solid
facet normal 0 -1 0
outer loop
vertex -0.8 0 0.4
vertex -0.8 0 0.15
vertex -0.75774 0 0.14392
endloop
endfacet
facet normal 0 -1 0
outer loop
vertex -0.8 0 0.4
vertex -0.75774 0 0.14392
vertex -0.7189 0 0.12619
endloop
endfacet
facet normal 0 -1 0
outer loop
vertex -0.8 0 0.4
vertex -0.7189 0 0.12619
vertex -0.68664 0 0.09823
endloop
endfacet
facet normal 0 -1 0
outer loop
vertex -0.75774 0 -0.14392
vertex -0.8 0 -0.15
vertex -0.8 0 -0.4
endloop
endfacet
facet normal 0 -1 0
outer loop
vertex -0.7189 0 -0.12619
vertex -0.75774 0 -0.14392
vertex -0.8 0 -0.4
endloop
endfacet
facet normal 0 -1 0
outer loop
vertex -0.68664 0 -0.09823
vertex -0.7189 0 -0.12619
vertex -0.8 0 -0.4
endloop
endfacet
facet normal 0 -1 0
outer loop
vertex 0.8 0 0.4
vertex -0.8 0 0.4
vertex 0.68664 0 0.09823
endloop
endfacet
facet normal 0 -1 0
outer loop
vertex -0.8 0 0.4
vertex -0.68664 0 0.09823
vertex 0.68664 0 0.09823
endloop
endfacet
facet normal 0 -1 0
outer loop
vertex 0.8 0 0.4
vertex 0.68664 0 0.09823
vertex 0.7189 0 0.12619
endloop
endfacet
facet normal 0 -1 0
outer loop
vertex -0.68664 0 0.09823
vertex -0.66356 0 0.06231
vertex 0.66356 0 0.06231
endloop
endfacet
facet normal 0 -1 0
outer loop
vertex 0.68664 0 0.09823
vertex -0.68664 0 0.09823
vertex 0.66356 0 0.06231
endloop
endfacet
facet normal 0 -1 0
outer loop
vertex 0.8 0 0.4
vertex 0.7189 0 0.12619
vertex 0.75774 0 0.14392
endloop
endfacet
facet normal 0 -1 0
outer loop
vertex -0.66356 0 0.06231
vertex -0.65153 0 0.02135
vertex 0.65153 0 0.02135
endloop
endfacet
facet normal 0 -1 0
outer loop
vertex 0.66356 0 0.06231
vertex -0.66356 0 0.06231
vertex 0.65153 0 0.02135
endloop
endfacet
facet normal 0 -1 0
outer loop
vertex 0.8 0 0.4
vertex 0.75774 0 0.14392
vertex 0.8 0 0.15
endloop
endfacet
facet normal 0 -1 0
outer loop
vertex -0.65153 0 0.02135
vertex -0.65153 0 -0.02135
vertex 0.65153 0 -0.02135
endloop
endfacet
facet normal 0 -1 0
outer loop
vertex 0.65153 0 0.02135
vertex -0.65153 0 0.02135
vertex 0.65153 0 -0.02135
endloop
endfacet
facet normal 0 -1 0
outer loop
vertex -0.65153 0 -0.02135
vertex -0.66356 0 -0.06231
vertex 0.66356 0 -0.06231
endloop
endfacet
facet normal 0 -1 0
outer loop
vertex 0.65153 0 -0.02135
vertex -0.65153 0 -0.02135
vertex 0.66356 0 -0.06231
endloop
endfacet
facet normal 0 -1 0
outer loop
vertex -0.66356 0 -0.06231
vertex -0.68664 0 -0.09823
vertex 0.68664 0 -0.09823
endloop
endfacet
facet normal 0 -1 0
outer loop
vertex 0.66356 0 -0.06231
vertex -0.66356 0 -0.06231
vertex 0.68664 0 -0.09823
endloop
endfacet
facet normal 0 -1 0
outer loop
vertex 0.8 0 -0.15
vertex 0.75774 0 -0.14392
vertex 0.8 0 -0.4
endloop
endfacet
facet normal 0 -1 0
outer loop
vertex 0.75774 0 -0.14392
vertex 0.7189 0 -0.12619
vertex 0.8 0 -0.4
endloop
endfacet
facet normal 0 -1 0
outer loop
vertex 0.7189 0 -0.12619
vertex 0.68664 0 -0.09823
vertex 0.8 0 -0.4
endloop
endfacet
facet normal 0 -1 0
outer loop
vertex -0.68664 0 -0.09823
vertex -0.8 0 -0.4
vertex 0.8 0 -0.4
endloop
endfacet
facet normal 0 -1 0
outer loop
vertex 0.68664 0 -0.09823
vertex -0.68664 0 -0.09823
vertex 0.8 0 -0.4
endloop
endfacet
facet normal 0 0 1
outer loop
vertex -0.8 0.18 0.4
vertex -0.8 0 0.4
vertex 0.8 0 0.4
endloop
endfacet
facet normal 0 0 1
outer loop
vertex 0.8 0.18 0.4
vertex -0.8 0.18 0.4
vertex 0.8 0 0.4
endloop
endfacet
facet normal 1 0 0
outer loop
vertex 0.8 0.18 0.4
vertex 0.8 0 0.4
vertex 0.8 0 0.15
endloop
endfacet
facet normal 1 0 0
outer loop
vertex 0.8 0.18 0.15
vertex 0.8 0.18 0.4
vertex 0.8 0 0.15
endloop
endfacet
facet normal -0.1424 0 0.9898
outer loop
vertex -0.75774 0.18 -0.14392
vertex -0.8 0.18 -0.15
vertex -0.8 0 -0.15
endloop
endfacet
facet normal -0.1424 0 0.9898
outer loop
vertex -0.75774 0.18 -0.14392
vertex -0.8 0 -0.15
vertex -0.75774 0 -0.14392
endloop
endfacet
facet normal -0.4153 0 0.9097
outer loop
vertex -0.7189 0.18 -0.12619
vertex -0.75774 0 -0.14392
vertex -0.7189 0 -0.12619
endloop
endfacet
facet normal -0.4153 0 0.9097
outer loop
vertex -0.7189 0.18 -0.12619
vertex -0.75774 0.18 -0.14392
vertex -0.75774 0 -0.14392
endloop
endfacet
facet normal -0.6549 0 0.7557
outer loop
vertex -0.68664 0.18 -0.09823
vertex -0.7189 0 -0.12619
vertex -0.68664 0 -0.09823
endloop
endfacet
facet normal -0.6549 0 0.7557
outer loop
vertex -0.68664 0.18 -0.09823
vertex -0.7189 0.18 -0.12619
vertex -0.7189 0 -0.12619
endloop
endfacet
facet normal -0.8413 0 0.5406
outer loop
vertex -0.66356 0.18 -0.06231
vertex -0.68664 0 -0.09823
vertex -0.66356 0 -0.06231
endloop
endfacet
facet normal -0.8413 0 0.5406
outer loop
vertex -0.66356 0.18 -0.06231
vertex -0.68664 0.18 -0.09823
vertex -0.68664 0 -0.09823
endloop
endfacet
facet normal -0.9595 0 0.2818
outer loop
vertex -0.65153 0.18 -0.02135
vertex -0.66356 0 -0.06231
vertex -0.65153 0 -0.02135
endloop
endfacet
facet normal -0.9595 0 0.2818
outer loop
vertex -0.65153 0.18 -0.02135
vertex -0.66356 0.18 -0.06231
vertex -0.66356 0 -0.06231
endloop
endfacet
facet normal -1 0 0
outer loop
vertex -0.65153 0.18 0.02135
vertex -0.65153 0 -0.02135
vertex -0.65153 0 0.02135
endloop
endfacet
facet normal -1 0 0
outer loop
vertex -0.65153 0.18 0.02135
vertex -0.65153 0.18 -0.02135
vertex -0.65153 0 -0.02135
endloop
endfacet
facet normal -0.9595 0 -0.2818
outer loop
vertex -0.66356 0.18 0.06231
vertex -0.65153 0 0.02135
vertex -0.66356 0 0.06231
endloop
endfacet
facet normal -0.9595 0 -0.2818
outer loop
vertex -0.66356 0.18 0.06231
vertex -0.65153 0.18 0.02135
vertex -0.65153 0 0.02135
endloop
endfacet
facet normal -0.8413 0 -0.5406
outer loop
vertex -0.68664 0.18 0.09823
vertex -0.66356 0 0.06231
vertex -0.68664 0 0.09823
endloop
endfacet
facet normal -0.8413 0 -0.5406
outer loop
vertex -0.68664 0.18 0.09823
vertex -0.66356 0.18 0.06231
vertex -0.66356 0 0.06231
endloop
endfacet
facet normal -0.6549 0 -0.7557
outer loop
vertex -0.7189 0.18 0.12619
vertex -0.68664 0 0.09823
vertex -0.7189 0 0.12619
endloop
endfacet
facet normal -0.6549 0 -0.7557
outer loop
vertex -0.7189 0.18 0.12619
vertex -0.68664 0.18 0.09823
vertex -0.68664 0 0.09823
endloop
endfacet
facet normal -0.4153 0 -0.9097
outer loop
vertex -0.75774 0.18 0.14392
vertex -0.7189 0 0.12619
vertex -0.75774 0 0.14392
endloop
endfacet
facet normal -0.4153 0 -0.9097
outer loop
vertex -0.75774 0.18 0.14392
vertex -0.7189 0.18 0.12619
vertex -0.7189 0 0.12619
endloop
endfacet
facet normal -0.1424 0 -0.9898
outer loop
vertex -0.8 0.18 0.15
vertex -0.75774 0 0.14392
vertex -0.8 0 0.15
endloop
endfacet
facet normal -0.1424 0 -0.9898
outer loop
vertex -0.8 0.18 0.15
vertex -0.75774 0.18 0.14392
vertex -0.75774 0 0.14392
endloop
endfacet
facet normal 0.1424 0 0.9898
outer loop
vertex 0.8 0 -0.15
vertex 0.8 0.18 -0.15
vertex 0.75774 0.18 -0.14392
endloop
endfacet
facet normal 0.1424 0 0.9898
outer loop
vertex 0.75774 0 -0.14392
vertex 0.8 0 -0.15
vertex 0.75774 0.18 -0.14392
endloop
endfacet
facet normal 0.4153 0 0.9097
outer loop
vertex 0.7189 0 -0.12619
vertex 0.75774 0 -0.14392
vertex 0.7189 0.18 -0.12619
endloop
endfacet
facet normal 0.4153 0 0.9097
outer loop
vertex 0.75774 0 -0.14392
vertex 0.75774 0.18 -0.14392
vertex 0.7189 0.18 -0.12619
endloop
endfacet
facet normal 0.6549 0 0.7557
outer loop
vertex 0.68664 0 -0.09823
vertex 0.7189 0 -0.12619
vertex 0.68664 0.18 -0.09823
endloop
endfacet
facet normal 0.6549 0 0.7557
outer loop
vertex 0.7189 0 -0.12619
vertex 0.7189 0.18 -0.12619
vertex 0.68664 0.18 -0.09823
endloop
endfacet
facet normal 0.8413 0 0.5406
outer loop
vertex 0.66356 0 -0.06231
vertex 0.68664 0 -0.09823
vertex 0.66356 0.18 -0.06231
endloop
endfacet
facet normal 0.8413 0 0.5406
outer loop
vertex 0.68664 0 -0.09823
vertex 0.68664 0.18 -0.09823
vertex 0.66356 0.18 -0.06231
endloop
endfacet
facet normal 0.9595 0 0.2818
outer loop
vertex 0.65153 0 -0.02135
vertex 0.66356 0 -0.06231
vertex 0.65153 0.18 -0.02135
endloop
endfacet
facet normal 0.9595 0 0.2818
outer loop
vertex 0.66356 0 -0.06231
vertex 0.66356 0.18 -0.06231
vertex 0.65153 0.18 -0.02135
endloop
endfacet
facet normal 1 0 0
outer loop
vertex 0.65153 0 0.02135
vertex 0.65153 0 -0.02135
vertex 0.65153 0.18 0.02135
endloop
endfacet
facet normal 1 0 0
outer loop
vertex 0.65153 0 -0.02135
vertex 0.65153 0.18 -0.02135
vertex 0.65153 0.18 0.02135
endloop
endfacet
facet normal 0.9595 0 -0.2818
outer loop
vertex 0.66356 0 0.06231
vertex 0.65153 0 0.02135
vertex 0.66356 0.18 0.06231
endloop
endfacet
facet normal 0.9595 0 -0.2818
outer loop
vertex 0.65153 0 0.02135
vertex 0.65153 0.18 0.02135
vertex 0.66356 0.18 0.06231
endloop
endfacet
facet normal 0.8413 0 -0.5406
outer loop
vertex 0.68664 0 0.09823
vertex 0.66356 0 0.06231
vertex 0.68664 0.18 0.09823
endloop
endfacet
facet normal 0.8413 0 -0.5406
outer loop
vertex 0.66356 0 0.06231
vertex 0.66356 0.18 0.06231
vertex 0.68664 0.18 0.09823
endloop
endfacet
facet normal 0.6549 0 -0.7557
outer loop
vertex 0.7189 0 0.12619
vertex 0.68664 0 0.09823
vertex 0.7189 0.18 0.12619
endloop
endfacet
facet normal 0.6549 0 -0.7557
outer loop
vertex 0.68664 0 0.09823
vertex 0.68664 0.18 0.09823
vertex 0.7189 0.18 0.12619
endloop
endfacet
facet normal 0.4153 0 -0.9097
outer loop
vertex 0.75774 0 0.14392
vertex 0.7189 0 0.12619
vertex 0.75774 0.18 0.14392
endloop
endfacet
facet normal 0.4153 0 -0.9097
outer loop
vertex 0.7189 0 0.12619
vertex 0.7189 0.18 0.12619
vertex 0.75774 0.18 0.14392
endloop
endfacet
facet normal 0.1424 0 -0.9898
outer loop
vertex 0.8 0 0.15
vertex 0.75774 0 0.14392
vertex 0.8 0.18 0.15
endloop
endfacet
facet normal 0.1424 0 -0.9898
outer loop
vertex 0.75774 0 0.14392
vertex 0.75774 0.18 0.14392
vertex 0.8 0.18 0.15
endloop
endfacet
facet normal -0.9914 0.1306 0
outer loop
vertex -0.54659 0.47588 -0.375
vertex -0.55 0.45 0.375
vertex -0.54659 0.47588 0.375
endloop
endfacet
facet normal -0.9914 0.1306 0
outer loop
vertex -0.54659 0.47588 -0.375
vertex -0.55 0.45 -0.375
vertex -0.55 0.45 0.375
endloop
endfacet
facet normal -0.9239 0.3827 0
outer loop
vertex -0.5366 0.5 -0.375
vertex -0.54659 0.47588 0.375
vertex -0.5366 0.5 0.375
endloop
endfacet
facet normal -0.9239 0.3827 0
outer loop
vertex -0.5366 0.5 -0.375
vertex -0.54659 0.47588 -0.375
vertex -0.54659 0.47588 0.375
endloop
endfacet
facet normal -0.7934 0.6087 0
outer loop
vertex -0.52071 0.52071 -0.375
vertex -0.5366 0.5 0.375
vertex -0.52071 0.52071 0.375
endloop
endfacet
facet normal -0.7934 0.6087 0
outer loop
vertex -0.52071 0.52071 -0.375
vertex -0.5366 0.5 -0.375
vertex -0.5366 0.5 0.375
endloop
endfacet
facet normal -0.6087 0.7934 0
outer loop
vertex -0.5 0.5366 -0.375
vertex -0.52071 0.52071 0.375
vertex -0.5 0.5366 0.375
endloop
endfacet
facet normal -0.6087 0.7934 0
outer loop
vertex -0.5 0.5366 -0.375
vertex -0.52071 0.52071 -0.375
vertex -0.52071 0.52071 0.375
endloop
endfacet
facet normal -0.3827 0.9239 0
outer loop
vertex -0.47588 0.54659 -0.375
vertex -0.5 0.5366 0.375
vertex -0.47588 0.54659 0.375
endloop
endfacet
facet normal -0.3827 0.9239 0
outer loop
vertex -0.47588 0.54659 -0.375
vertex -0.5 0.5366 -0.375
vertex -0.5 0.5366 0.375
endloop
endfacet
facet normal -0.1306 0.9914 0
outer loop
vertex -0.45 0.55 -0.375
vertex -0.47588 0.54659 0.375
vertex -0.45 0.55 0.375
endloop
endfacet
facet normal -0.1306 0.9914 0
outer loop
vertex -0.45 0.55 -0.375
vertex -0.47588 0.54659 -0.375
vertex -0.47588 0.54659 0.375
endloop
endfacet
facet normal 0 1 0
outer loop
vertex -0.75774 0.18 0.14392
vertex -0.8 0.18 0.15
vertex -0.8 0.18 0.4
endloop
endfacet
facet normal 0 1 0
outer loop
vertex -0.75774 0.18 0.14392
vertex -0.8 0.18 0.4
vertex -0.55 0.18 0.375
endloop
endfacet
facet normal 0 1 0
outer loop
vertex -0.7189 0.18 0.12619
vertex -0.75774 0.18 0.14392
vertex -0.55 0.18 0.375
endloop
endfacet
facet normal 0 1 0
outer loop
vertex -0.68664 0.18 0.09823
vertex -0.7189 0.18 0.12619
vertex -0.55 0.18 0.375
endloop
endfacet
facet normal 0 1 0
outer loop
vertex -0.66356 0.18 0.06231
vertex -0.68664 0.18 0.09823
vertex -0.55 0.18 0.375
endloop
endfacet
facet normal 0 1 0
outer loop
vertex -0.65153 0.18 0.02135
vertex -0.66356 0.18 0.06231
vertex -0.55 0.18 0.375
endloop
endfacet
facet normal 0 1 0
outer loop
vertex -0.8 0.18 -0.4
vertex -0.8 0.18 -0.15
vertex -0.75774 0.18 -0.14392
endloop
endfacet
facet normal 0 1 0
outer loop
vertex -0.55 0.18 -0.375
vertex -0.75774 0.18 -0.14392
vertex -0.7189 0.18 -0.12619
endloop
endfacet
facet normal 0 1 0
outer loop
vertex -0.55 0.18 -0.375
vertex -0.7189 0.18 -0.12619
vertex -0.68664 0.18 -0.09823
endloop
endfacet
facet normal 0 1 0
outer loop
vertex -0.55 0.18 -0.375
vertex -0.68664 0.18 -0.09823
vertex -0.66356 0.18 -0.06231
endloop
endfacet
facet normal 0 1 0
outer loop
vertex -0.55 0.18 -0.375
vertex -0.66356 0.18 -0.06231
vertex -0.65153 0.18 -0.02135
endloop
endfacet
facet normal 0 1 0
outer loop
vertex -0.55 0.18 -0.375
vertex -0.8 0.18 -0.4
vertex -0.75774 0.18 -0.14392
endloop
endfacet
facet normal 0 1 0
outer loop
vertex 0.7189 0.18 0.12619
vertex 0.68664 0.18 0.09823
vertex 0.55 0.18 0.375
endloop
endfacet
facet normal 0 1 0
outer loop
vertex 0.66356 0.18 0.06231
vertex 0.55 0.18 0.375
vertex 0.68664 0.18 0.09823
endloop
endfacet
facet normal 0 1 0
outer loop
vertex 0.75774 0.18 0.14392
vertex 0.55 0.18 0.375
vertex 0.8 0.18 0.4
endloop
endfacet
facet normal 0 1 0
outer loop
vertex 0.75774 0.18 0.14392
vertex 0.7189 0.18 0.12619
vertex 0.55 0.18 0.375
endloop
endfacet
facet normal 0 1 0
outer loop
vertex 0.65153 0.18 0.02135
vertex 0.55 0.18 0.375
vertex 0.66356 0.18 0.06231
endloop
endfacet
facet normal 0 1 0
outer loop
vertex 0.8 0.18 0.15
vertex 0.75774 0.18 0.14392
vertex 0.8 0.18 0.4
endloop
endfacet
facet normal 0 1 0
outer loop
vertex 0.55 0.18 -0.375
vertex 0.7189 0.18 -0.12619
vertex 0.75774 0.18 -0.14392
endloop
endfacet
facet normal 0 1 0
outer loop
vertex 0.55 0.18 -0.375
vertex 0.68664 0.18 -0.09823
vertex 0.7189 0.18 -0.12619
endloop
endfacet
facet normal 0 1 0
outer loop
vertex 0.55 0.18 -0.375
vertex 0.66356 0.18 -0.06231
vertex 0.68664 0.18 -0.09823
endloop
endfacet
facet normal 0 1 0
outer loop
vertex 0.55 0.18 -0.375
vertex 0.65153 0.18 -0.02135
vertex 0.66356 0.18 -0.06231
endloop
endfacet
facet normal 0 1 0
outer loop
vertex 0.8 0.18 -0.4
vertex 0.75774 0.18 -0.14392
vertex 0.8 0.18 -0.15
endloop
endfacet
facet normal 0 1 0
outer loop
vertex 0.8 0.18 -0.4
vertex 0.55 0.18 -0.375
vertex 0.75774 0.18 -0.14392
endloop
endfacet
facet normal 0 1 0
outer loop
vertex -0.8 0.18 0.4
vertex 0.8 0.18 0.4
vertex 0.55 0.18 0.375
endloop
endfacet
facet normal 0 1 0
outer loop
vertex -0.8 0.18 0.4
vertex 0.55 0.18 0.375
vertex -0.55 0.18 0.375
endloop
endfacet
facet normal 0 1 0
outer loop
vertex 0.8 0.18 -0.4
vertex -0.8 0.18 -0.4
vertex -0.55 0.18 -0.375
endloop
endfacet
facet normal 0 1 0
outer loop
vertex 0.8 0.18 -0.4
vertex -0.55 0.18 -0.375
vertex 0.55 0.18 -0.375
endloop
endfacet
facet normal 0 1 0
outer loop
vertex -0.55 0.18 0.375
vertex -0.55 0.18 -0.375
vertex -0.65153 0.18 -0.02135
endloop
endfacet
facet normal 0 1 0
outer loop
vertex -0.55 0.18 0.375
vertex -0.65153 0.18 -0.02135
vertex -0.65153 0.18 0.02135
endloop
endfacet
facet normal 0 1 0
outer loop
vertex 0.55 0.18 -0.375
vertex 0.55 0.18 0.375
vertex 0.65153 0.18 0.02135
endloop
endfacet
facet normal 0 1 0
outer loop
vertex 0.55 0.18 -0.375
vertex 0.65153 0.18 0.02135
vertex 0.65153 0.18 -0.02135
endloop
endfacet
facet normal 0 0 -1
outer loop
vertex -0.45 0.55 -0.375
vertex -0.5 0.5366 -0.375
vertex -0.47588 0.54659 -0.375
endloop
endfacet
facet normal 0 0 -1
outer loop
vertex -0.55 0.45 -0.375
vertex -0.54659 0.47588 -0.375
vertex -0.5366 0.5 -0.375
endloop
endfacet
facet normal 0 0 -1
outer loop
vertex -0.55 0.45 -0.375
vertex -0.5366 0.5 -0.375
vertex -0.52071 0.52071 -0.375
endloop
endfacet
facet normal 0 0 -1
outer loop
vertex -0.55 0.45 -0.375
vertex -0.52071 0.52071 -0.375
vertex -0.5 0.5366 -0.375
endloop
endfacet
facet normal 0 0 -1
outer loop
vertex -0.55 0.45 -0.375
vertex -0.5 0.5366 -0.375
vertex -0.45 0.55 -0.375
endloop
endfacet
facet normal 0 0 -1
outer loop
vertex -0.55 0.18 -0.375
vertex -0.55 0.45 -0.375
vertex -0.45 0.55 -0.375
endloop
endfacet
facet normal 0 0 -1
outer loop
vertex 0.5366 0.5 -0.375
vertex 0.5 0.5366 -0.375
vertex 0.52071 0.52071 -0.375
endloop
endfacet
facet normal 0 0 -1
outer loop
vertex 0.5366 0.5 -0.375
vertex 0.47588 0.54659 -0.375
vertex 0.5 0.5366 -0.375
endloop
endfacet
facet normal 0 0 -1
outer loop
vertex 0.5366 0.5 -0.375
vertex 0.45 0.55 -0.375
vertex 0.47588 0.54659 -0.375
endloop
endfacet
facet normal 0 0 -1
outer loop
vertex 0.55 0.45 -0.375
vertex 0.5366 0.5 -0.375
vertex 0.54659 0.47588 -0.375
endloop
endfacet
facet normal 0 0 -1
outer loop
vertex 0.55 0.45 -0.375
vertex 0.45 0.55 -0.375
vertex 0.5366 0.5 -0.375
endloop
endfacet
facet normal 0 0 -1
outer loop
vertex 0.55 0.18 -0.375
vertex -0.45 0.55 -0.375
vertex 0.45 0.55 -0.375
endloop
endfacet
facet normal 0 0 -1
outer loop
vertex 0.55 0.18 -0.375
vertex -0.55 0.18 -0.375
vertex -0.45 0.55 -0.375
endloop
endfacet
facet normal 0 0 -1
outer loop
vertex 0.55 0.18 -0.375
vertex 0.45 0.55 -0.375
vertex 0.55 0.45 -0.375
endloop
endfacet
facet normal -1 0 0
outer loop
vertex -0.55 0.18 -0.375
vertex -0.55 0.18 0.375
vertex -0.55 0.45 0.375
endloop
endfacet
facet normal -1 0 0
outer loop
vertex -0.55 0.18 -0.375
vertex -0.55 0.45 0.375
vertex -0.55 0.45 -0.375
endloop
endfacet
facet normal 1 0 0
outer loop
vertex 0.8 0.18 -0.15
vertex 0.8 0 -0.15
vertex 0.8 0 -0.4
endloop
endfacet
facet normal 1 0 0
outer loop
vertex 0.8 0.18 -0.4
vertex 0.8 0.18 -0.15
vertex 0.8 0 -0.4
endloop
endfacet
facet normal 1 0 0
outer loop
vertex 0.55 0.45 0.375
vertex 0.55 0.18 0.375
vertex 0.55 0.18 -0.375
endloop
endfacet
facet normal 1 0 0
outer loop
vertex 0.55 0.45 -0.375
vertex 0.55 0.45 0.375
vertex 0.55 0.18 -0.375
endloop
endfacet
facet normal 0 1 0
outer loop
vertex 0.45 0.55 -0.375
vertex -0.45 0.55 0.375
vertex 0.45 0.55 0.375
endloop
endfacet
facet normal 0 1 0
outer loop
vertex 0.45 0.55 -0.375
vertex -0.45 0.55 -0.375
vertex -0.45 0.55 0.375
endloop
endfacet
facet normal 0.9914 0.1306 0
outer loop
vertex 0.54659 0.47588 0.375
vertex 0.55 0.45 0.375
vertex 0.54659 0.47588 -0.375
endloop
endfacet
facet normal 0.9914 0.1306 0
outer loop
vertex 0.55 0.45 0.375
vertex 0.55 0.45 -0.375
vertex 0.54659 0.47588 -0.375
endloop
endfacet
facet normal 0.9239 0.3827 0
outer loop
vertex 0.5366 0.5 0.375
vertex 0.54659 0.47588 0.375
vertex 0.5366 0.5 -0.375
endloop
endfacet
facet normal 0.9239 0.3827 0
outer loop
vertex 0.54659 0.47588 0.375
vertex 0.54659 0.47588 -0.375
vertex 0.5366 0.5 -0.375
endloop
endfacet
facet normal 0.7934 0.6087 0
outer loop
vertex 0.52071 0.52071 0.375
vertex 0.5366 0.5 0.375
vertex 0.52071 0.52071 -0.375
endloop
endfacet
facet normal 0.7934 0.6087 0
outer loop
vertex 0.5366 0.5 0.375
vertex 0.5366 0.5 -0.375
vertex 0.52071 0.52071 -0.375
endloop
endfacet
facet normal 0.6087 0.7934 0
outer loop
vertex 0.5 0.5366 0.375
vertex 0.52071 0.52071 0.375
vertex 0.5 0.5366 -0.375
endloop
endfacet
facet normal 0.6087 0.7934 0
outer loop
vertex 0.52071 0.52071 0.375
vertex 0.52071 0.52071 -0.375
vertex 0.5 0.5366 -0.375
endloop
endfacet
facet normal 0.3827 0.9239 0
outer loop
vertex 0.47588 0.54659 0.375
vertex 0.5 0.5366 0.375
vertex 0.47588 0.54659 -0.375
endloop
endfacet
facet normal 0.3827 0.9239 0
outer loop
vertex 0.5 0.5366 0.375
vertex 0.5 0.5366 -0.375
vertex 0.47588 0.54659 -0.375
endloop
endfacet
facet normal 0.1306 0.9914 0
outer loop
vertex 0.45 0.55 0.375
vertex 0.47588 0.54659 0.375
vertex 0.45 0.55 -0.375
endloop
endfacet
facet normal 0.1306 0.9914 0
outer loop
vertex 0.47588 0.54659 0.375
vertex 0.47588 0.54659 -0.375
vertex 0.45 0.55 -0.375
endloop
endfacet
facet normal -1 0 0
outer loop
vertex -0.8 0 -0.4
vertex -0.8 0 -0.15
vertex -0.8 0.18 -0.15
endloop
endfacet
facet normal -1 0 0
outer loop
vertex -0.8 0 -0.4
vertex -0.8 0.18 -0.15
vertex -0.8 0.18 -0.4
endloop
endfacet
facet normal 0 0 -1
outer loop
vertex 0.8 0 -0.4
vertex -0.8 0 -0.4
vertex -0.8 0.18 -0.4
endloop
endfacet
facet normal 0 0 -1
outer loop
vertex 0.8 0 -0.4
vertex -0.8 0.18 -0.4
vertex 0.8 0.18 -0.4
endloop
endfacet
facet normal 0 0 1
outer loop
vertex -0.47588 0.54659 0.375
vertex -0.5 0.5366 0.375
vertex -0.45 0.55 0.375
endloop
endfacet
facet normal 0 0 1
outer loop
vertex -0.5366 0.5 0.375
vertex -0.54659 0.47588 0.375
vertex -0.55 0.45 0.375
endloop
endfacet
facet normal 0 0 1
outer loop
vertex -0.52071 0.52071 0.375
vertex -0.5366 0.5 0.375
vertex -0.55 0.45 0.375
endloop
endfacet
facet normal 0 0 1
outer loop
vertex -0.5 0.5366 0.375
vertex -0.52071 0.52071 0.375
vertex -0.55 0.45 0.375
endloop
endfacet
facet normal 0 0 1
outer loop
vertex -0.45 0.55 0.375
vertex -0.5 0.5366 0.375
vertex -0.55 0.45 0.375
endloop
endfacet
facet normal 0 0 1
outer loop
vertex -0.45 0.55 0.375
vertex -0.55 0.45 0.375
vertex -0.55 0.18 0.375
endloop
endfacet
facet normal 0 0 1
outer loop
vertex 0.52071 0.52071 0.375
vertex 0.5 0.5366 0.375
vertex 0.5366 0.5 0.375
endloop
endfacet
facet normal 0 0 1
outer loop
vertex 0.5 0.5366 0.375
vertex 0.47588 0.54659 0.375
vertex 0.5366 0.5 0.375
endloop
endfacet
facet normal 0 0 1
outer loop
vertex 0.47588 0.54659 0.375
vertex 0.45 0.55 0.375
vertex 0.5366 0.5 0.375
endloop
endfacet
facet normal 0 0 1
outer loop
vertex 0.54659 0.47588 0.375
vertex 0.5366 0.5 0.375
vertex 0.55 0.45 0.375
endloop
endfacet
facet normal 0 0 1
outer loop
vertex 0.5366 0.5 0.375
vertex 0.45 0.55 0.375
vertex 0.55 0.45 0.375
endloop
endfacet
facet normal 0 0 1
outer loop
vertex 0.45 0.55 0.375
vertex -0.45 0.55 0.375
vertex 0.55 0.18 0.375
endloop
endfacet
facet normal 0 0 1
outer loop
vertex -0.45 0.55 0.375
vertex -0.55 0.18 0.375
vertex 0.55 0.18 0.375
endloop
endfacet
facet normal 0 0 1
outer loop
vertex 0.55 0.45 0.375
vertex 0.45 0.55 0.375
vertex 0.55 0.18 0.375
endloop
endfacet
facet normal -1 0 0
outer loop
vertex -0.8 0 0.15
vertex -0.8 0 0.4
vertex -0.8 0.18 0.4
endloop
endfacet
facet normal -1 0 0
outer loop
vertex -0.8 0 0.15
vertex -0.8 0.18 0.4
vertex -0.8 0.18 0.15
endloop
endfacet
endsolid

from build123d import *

# Parameters (mm, degrees)
SKETCH1_W           = 1.6
SKETCH1_H           = 0.8
BOSS_EXTRUDE1_DEPTH = 0.18
CUT_EXTRUDE1_DEPTH  = 0.18
SKETCH3_W           = 1.1
SKETCH3_H           = 0.75
BOSS_EXTRUDE2_DEPTH = 0.37
FILLET1_R           = 0.1


with BuildPart() as part:
    # Sketch1 → Boss-Extrude1 (new body)
    with BuildSketch(Plane(origin=(0, 0, 0), x_dir=(1, 0, 0), z_dir=(0, 1, 0))):
        Rectangle(SKETCH1_W, SKETCH1_H)
    extrude(amount=BOSS_EXTRUDE1_DEPTH)

    # Sketch2 → Cut-Extrude1 (cut)
    with BuildSketch(Plane(origin=(0, 0.18, 0), x_dir=(1, 0, 0), z_dir=(0, 1, 0))):
        with BuildLine():
            Line((-0.8, -0.15), (-0.8, 0.15))
            ThreePointArc((-0.8, 0.15), (-0.65, 0), (-0.8, -0.15))
        make_face()
    cut_extrude1 = extrude(amount=-CUT_EXTRUDE1_DEPTH, mode=Mode.SUBTRACT)

    # Mirror1: Cut-Extrude1 across plane
    add(cut_extrude1.mirror(Plane(origin=(0, 0, 0), x_dir=(0, 0, 1), z_dir=(1, 0, 0))), mode=Mode.SUBTRACT)

    # Sketch3 → Boss-Extrude2 (add)
    with BuildSketch(Plane(origin=(0, 0.18, 0), x_dir=(1, 0, 0), z_dir=(0, 1, 0))):
        Rectangle(SKETCH3_W, SKETCH3_H)
    extrude(amount=BOSS_EXTRUDE2_DEPTH)

    # Fillet1
    fillet1_edges = [part.edges().sort_by_distance(p)[0] for p in [
        (0.55, 0.55, 0),
        (-0.55, 0.55, 0),
    ]]
    fillet(fillet1_edges, radius=FILLET1_R)


solid = part.part
